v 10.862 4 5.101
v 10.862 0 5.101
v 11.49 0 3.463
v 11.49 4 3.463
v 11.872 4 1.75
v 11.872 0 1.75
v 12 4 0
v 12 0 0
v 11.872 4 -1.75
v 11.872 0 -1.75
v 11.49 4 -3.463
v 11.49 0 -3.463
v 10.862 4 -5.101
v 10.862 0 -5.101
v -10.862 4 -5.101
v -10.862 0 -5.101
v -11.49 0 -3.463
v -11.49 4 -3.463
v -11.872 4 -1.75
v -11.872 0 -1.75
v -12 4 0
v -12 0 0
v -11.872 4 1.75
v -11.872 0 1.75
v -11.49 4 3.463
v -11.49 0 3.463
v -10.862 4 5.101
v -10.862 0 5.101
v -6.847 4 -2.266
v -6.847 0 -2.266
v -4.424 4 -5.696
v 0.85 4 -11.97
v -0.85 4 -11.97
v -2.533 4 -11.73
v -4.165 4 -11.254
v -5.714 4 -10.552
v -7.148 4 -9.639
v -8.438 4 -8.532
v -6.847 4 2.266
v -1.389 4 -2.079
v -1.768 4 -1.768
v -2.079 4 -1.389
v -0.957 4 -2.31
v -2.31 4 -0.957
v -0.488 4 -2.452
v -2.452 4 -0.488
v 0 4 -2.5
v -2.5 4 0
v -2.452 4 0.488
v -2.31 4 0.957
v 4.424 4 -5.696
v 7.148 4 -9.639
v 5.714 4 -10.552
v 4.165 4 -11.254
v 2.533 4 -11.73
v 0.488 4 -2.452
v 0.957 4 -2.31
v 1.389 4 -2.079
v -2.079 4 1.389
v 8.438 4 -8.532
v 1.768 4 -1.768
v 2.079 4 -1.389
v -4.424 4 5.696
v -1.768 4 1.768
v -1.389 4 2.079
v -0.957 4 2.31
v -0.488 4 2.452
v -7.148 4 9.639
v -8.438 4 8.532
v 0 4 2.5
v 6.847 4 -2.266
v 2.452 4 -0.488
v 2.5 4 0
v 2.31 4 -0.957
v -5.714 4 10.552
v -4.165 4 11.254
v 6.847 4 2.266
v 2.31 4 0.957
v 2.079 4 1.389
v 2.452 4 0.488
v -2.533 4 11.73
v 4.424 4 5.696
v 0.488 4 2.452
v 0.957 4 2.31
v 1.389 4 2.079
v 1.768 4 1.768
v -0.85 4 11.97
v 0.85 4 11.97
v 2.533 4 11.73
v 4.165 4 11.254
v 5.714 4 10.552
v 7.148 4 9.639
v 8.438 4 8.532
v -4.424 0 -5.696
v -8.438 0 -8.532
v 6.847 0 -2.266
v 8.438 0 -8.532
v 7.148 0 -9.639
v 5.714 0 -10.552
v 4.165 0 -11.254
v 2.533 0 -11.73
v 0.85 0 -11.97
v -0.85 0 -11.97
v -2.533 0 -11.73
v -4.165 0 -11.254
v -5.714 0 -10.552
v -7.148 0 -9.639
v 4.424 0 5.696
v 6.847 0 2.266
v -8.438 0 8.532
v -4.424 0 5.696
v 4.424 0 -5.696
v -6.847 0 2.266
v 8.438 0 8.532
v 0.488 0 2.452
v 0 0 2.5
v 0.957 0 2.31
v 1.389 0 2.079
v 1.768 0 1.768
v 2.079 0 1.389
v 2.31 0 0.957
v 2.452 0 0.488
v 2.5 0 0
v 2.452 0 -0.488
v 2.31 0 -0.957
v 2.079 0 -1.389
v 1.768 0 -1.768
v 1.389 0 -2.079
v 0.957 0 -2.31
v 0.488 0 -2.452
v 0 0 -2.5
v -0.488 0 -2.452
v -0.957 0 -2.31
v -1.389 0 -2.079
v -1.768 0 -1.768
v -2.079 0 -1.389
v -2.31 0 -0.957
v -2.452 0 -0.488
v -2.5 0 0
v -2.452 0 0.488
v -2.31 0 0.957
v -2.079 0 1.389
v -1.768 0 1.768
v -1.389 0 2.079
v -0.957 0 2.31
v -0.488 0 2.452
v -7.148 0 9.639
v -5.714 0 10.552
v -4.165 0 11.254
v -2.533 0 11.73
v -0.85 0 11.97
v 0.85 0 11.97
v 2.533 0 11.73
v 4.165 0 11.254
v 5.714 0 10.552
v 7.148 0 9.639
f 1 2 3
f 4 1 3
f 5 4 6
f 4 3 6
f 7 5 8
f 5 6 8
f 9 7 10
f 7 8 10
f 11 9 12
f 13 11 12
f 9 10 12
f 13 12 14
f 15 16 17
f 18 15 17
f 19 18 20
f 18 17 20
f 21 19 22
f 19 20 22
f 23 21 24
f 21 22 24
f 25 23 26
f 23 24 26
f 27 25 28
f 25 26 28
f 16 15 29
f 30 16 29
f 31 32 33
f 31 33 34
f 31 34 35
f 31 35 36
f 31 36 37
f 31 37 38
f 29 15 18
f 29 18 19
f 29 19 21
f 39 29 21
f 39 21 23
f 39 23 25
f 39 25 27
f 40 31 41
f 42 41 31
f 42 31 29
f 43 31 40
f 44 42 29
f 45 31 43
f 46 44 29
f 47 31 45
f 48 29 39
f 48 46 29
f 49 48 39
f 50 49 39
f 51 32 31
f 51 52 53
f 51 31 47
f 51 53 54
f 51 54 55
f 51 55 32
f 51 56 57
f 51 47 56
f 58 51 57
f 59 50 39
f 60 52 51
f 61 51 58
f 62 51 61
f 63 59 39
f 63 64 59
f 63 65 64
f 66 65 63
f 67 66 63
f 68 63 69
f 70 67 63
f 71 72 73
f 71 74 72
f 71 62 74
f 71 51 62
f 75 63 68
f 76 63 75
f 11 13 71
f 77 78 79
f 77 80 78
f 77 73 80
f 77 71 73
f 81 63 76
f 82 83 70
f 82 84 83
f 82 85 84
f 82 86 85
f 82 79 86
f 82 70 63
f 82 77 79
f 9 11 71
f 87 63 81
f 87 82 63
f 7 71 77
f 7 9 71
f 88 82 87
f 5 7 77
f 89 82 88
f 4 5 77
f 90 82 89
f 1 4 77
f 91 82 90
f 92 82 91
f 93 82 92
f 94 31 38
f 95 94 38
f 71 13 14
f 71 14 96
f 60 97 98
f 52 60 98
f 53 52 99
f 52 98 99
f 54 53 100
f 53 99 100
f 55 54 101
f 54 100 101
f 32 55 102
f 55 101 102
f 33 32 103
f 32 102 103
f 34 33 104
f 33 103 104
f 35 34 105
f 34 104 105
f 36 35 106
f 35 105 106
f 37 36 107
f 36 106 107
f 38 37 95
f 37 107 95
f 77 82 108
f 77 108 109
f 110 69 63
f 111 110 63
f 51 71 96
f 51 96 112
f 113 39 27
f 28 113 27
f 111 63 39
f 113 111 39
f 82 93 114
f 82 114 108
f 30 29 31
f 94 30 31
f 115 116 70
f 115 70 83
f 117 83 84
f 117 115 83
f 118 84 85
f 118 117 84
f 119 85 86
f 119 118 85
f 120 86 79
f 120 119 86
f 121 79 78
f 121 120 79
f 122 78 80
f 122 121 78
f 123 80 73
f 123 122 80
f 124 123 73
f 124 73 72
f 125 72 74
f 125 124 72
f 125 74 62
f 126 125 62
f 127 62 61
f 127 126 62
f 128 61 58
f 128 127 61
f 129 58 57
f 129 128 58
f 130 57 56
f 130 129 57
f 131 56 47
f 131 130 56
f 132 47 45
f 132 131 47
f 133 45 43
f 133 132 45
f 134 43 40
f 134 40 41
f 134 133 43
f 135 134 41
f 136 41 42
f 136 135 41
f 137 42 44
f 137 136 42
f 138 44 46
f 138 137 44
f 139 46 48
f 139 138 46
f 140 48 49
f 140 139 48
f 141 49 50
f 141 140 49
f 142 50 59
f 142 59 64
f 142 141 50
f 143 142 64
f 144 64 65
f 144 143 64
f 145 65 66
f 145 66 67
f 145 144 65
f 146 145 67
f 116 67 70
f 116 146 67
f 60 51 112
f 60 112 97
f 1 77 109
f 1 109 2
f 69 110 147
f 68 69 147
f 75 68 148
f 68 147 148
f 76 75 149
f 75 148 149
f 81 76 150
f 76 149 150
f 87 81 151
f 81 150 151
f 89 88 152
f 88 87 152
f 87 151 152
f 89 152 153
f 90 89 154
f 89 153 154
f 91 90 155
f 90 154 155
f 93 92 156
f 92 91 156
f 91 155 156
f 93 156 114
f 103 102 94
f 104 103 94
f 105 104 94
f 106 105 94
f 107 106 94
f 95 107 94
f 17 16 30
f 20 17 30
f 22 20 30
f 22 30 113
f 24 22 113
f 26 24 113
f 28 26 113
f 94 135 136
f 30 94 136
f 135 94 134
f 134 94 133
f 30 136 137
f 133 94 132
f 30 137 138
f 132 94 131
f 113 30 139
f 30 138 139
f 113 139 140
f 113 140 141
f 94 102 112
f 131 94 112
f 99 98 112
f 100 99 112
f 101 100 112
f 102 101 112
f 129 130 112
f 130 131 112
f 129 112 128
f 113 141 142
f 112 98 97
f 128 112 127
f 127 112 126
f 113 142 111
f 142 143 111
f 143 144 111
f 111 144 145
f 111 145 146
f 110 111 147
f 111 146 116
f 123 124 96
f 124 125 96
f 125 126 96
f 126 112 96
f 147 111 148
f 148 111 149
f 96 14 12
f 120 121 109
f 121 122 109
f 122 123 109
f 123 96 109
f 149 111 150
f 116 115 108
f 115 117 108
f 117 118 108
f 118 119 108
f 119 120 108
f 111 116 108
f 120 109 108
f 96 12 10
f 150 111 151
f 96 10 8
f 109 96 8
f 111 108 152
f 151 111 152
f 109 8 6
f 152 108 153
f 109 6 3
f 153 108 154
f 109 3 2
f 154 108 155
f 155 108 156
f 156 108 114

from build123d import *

# Parameters (mm, degrees)
CROQUIS1_R              = 12
CROQUIS1_R_2            = 2.5
SALIENTE_EXTRUIR1_DEPTH = 4
CORTAR_EXTRUIR1_DEPTH   = 4


with BuildPart() as part:
    # Croquis1 → Saliente-Extruir1 (new body)
    with BuildSketch(Plane(origin=(0, 0, 0), x_dir=(1, 0, 0), z_dir=(0, 1, 0))):
        with Locations(Location((0, 0, 0), (0, 0, 270))):
            Circle(CROQUIS1_R)
        with Locations(Location((0, 0, 0), (0, 0, 270))):
            Circle(CROQUIS1_R_2, mode=Mode.SUBTRACT)
    extrude(amount=SALIENTE_EXTRUIR1_DEPTH)

    # Croquis3 → Cortar-Extruir1 (cut)
    with BuildSketch(Plane(origin=(0, 4, 0), x_dir=(1, 0, 0), z_dir=(0, 1, 0))):
        Polygon((15.178438839, 8.150766492), (6.84734968, 2.265789565), (4.424123887, 5.696238042), (12.755213045, 11.581214969), align=None)
        Polygon((-4.424123887, -5.696238042), (-6.84734968, -2.265789565), (-15.178438839, -8.150766492), (-12.755213045, -11.581214969), align=None)
        Polygon((12.755213045, -11.581214969), (4.424123887, -5.696238042), (6.84734968, -2.265789565), (15.178438839, -8.150766492), align=None)
        Polygon((-6.84734968, 2.265789565), (-4.424123887, 5.696238042), (-12.755213045, 11.581214969), (-15.178438839, 8.150766492), align=None)
    extrude(amount=-CORTAR_EXTRUIR1_DEPTH, mode=Mode.SUBTRACT)


solid = part.part
